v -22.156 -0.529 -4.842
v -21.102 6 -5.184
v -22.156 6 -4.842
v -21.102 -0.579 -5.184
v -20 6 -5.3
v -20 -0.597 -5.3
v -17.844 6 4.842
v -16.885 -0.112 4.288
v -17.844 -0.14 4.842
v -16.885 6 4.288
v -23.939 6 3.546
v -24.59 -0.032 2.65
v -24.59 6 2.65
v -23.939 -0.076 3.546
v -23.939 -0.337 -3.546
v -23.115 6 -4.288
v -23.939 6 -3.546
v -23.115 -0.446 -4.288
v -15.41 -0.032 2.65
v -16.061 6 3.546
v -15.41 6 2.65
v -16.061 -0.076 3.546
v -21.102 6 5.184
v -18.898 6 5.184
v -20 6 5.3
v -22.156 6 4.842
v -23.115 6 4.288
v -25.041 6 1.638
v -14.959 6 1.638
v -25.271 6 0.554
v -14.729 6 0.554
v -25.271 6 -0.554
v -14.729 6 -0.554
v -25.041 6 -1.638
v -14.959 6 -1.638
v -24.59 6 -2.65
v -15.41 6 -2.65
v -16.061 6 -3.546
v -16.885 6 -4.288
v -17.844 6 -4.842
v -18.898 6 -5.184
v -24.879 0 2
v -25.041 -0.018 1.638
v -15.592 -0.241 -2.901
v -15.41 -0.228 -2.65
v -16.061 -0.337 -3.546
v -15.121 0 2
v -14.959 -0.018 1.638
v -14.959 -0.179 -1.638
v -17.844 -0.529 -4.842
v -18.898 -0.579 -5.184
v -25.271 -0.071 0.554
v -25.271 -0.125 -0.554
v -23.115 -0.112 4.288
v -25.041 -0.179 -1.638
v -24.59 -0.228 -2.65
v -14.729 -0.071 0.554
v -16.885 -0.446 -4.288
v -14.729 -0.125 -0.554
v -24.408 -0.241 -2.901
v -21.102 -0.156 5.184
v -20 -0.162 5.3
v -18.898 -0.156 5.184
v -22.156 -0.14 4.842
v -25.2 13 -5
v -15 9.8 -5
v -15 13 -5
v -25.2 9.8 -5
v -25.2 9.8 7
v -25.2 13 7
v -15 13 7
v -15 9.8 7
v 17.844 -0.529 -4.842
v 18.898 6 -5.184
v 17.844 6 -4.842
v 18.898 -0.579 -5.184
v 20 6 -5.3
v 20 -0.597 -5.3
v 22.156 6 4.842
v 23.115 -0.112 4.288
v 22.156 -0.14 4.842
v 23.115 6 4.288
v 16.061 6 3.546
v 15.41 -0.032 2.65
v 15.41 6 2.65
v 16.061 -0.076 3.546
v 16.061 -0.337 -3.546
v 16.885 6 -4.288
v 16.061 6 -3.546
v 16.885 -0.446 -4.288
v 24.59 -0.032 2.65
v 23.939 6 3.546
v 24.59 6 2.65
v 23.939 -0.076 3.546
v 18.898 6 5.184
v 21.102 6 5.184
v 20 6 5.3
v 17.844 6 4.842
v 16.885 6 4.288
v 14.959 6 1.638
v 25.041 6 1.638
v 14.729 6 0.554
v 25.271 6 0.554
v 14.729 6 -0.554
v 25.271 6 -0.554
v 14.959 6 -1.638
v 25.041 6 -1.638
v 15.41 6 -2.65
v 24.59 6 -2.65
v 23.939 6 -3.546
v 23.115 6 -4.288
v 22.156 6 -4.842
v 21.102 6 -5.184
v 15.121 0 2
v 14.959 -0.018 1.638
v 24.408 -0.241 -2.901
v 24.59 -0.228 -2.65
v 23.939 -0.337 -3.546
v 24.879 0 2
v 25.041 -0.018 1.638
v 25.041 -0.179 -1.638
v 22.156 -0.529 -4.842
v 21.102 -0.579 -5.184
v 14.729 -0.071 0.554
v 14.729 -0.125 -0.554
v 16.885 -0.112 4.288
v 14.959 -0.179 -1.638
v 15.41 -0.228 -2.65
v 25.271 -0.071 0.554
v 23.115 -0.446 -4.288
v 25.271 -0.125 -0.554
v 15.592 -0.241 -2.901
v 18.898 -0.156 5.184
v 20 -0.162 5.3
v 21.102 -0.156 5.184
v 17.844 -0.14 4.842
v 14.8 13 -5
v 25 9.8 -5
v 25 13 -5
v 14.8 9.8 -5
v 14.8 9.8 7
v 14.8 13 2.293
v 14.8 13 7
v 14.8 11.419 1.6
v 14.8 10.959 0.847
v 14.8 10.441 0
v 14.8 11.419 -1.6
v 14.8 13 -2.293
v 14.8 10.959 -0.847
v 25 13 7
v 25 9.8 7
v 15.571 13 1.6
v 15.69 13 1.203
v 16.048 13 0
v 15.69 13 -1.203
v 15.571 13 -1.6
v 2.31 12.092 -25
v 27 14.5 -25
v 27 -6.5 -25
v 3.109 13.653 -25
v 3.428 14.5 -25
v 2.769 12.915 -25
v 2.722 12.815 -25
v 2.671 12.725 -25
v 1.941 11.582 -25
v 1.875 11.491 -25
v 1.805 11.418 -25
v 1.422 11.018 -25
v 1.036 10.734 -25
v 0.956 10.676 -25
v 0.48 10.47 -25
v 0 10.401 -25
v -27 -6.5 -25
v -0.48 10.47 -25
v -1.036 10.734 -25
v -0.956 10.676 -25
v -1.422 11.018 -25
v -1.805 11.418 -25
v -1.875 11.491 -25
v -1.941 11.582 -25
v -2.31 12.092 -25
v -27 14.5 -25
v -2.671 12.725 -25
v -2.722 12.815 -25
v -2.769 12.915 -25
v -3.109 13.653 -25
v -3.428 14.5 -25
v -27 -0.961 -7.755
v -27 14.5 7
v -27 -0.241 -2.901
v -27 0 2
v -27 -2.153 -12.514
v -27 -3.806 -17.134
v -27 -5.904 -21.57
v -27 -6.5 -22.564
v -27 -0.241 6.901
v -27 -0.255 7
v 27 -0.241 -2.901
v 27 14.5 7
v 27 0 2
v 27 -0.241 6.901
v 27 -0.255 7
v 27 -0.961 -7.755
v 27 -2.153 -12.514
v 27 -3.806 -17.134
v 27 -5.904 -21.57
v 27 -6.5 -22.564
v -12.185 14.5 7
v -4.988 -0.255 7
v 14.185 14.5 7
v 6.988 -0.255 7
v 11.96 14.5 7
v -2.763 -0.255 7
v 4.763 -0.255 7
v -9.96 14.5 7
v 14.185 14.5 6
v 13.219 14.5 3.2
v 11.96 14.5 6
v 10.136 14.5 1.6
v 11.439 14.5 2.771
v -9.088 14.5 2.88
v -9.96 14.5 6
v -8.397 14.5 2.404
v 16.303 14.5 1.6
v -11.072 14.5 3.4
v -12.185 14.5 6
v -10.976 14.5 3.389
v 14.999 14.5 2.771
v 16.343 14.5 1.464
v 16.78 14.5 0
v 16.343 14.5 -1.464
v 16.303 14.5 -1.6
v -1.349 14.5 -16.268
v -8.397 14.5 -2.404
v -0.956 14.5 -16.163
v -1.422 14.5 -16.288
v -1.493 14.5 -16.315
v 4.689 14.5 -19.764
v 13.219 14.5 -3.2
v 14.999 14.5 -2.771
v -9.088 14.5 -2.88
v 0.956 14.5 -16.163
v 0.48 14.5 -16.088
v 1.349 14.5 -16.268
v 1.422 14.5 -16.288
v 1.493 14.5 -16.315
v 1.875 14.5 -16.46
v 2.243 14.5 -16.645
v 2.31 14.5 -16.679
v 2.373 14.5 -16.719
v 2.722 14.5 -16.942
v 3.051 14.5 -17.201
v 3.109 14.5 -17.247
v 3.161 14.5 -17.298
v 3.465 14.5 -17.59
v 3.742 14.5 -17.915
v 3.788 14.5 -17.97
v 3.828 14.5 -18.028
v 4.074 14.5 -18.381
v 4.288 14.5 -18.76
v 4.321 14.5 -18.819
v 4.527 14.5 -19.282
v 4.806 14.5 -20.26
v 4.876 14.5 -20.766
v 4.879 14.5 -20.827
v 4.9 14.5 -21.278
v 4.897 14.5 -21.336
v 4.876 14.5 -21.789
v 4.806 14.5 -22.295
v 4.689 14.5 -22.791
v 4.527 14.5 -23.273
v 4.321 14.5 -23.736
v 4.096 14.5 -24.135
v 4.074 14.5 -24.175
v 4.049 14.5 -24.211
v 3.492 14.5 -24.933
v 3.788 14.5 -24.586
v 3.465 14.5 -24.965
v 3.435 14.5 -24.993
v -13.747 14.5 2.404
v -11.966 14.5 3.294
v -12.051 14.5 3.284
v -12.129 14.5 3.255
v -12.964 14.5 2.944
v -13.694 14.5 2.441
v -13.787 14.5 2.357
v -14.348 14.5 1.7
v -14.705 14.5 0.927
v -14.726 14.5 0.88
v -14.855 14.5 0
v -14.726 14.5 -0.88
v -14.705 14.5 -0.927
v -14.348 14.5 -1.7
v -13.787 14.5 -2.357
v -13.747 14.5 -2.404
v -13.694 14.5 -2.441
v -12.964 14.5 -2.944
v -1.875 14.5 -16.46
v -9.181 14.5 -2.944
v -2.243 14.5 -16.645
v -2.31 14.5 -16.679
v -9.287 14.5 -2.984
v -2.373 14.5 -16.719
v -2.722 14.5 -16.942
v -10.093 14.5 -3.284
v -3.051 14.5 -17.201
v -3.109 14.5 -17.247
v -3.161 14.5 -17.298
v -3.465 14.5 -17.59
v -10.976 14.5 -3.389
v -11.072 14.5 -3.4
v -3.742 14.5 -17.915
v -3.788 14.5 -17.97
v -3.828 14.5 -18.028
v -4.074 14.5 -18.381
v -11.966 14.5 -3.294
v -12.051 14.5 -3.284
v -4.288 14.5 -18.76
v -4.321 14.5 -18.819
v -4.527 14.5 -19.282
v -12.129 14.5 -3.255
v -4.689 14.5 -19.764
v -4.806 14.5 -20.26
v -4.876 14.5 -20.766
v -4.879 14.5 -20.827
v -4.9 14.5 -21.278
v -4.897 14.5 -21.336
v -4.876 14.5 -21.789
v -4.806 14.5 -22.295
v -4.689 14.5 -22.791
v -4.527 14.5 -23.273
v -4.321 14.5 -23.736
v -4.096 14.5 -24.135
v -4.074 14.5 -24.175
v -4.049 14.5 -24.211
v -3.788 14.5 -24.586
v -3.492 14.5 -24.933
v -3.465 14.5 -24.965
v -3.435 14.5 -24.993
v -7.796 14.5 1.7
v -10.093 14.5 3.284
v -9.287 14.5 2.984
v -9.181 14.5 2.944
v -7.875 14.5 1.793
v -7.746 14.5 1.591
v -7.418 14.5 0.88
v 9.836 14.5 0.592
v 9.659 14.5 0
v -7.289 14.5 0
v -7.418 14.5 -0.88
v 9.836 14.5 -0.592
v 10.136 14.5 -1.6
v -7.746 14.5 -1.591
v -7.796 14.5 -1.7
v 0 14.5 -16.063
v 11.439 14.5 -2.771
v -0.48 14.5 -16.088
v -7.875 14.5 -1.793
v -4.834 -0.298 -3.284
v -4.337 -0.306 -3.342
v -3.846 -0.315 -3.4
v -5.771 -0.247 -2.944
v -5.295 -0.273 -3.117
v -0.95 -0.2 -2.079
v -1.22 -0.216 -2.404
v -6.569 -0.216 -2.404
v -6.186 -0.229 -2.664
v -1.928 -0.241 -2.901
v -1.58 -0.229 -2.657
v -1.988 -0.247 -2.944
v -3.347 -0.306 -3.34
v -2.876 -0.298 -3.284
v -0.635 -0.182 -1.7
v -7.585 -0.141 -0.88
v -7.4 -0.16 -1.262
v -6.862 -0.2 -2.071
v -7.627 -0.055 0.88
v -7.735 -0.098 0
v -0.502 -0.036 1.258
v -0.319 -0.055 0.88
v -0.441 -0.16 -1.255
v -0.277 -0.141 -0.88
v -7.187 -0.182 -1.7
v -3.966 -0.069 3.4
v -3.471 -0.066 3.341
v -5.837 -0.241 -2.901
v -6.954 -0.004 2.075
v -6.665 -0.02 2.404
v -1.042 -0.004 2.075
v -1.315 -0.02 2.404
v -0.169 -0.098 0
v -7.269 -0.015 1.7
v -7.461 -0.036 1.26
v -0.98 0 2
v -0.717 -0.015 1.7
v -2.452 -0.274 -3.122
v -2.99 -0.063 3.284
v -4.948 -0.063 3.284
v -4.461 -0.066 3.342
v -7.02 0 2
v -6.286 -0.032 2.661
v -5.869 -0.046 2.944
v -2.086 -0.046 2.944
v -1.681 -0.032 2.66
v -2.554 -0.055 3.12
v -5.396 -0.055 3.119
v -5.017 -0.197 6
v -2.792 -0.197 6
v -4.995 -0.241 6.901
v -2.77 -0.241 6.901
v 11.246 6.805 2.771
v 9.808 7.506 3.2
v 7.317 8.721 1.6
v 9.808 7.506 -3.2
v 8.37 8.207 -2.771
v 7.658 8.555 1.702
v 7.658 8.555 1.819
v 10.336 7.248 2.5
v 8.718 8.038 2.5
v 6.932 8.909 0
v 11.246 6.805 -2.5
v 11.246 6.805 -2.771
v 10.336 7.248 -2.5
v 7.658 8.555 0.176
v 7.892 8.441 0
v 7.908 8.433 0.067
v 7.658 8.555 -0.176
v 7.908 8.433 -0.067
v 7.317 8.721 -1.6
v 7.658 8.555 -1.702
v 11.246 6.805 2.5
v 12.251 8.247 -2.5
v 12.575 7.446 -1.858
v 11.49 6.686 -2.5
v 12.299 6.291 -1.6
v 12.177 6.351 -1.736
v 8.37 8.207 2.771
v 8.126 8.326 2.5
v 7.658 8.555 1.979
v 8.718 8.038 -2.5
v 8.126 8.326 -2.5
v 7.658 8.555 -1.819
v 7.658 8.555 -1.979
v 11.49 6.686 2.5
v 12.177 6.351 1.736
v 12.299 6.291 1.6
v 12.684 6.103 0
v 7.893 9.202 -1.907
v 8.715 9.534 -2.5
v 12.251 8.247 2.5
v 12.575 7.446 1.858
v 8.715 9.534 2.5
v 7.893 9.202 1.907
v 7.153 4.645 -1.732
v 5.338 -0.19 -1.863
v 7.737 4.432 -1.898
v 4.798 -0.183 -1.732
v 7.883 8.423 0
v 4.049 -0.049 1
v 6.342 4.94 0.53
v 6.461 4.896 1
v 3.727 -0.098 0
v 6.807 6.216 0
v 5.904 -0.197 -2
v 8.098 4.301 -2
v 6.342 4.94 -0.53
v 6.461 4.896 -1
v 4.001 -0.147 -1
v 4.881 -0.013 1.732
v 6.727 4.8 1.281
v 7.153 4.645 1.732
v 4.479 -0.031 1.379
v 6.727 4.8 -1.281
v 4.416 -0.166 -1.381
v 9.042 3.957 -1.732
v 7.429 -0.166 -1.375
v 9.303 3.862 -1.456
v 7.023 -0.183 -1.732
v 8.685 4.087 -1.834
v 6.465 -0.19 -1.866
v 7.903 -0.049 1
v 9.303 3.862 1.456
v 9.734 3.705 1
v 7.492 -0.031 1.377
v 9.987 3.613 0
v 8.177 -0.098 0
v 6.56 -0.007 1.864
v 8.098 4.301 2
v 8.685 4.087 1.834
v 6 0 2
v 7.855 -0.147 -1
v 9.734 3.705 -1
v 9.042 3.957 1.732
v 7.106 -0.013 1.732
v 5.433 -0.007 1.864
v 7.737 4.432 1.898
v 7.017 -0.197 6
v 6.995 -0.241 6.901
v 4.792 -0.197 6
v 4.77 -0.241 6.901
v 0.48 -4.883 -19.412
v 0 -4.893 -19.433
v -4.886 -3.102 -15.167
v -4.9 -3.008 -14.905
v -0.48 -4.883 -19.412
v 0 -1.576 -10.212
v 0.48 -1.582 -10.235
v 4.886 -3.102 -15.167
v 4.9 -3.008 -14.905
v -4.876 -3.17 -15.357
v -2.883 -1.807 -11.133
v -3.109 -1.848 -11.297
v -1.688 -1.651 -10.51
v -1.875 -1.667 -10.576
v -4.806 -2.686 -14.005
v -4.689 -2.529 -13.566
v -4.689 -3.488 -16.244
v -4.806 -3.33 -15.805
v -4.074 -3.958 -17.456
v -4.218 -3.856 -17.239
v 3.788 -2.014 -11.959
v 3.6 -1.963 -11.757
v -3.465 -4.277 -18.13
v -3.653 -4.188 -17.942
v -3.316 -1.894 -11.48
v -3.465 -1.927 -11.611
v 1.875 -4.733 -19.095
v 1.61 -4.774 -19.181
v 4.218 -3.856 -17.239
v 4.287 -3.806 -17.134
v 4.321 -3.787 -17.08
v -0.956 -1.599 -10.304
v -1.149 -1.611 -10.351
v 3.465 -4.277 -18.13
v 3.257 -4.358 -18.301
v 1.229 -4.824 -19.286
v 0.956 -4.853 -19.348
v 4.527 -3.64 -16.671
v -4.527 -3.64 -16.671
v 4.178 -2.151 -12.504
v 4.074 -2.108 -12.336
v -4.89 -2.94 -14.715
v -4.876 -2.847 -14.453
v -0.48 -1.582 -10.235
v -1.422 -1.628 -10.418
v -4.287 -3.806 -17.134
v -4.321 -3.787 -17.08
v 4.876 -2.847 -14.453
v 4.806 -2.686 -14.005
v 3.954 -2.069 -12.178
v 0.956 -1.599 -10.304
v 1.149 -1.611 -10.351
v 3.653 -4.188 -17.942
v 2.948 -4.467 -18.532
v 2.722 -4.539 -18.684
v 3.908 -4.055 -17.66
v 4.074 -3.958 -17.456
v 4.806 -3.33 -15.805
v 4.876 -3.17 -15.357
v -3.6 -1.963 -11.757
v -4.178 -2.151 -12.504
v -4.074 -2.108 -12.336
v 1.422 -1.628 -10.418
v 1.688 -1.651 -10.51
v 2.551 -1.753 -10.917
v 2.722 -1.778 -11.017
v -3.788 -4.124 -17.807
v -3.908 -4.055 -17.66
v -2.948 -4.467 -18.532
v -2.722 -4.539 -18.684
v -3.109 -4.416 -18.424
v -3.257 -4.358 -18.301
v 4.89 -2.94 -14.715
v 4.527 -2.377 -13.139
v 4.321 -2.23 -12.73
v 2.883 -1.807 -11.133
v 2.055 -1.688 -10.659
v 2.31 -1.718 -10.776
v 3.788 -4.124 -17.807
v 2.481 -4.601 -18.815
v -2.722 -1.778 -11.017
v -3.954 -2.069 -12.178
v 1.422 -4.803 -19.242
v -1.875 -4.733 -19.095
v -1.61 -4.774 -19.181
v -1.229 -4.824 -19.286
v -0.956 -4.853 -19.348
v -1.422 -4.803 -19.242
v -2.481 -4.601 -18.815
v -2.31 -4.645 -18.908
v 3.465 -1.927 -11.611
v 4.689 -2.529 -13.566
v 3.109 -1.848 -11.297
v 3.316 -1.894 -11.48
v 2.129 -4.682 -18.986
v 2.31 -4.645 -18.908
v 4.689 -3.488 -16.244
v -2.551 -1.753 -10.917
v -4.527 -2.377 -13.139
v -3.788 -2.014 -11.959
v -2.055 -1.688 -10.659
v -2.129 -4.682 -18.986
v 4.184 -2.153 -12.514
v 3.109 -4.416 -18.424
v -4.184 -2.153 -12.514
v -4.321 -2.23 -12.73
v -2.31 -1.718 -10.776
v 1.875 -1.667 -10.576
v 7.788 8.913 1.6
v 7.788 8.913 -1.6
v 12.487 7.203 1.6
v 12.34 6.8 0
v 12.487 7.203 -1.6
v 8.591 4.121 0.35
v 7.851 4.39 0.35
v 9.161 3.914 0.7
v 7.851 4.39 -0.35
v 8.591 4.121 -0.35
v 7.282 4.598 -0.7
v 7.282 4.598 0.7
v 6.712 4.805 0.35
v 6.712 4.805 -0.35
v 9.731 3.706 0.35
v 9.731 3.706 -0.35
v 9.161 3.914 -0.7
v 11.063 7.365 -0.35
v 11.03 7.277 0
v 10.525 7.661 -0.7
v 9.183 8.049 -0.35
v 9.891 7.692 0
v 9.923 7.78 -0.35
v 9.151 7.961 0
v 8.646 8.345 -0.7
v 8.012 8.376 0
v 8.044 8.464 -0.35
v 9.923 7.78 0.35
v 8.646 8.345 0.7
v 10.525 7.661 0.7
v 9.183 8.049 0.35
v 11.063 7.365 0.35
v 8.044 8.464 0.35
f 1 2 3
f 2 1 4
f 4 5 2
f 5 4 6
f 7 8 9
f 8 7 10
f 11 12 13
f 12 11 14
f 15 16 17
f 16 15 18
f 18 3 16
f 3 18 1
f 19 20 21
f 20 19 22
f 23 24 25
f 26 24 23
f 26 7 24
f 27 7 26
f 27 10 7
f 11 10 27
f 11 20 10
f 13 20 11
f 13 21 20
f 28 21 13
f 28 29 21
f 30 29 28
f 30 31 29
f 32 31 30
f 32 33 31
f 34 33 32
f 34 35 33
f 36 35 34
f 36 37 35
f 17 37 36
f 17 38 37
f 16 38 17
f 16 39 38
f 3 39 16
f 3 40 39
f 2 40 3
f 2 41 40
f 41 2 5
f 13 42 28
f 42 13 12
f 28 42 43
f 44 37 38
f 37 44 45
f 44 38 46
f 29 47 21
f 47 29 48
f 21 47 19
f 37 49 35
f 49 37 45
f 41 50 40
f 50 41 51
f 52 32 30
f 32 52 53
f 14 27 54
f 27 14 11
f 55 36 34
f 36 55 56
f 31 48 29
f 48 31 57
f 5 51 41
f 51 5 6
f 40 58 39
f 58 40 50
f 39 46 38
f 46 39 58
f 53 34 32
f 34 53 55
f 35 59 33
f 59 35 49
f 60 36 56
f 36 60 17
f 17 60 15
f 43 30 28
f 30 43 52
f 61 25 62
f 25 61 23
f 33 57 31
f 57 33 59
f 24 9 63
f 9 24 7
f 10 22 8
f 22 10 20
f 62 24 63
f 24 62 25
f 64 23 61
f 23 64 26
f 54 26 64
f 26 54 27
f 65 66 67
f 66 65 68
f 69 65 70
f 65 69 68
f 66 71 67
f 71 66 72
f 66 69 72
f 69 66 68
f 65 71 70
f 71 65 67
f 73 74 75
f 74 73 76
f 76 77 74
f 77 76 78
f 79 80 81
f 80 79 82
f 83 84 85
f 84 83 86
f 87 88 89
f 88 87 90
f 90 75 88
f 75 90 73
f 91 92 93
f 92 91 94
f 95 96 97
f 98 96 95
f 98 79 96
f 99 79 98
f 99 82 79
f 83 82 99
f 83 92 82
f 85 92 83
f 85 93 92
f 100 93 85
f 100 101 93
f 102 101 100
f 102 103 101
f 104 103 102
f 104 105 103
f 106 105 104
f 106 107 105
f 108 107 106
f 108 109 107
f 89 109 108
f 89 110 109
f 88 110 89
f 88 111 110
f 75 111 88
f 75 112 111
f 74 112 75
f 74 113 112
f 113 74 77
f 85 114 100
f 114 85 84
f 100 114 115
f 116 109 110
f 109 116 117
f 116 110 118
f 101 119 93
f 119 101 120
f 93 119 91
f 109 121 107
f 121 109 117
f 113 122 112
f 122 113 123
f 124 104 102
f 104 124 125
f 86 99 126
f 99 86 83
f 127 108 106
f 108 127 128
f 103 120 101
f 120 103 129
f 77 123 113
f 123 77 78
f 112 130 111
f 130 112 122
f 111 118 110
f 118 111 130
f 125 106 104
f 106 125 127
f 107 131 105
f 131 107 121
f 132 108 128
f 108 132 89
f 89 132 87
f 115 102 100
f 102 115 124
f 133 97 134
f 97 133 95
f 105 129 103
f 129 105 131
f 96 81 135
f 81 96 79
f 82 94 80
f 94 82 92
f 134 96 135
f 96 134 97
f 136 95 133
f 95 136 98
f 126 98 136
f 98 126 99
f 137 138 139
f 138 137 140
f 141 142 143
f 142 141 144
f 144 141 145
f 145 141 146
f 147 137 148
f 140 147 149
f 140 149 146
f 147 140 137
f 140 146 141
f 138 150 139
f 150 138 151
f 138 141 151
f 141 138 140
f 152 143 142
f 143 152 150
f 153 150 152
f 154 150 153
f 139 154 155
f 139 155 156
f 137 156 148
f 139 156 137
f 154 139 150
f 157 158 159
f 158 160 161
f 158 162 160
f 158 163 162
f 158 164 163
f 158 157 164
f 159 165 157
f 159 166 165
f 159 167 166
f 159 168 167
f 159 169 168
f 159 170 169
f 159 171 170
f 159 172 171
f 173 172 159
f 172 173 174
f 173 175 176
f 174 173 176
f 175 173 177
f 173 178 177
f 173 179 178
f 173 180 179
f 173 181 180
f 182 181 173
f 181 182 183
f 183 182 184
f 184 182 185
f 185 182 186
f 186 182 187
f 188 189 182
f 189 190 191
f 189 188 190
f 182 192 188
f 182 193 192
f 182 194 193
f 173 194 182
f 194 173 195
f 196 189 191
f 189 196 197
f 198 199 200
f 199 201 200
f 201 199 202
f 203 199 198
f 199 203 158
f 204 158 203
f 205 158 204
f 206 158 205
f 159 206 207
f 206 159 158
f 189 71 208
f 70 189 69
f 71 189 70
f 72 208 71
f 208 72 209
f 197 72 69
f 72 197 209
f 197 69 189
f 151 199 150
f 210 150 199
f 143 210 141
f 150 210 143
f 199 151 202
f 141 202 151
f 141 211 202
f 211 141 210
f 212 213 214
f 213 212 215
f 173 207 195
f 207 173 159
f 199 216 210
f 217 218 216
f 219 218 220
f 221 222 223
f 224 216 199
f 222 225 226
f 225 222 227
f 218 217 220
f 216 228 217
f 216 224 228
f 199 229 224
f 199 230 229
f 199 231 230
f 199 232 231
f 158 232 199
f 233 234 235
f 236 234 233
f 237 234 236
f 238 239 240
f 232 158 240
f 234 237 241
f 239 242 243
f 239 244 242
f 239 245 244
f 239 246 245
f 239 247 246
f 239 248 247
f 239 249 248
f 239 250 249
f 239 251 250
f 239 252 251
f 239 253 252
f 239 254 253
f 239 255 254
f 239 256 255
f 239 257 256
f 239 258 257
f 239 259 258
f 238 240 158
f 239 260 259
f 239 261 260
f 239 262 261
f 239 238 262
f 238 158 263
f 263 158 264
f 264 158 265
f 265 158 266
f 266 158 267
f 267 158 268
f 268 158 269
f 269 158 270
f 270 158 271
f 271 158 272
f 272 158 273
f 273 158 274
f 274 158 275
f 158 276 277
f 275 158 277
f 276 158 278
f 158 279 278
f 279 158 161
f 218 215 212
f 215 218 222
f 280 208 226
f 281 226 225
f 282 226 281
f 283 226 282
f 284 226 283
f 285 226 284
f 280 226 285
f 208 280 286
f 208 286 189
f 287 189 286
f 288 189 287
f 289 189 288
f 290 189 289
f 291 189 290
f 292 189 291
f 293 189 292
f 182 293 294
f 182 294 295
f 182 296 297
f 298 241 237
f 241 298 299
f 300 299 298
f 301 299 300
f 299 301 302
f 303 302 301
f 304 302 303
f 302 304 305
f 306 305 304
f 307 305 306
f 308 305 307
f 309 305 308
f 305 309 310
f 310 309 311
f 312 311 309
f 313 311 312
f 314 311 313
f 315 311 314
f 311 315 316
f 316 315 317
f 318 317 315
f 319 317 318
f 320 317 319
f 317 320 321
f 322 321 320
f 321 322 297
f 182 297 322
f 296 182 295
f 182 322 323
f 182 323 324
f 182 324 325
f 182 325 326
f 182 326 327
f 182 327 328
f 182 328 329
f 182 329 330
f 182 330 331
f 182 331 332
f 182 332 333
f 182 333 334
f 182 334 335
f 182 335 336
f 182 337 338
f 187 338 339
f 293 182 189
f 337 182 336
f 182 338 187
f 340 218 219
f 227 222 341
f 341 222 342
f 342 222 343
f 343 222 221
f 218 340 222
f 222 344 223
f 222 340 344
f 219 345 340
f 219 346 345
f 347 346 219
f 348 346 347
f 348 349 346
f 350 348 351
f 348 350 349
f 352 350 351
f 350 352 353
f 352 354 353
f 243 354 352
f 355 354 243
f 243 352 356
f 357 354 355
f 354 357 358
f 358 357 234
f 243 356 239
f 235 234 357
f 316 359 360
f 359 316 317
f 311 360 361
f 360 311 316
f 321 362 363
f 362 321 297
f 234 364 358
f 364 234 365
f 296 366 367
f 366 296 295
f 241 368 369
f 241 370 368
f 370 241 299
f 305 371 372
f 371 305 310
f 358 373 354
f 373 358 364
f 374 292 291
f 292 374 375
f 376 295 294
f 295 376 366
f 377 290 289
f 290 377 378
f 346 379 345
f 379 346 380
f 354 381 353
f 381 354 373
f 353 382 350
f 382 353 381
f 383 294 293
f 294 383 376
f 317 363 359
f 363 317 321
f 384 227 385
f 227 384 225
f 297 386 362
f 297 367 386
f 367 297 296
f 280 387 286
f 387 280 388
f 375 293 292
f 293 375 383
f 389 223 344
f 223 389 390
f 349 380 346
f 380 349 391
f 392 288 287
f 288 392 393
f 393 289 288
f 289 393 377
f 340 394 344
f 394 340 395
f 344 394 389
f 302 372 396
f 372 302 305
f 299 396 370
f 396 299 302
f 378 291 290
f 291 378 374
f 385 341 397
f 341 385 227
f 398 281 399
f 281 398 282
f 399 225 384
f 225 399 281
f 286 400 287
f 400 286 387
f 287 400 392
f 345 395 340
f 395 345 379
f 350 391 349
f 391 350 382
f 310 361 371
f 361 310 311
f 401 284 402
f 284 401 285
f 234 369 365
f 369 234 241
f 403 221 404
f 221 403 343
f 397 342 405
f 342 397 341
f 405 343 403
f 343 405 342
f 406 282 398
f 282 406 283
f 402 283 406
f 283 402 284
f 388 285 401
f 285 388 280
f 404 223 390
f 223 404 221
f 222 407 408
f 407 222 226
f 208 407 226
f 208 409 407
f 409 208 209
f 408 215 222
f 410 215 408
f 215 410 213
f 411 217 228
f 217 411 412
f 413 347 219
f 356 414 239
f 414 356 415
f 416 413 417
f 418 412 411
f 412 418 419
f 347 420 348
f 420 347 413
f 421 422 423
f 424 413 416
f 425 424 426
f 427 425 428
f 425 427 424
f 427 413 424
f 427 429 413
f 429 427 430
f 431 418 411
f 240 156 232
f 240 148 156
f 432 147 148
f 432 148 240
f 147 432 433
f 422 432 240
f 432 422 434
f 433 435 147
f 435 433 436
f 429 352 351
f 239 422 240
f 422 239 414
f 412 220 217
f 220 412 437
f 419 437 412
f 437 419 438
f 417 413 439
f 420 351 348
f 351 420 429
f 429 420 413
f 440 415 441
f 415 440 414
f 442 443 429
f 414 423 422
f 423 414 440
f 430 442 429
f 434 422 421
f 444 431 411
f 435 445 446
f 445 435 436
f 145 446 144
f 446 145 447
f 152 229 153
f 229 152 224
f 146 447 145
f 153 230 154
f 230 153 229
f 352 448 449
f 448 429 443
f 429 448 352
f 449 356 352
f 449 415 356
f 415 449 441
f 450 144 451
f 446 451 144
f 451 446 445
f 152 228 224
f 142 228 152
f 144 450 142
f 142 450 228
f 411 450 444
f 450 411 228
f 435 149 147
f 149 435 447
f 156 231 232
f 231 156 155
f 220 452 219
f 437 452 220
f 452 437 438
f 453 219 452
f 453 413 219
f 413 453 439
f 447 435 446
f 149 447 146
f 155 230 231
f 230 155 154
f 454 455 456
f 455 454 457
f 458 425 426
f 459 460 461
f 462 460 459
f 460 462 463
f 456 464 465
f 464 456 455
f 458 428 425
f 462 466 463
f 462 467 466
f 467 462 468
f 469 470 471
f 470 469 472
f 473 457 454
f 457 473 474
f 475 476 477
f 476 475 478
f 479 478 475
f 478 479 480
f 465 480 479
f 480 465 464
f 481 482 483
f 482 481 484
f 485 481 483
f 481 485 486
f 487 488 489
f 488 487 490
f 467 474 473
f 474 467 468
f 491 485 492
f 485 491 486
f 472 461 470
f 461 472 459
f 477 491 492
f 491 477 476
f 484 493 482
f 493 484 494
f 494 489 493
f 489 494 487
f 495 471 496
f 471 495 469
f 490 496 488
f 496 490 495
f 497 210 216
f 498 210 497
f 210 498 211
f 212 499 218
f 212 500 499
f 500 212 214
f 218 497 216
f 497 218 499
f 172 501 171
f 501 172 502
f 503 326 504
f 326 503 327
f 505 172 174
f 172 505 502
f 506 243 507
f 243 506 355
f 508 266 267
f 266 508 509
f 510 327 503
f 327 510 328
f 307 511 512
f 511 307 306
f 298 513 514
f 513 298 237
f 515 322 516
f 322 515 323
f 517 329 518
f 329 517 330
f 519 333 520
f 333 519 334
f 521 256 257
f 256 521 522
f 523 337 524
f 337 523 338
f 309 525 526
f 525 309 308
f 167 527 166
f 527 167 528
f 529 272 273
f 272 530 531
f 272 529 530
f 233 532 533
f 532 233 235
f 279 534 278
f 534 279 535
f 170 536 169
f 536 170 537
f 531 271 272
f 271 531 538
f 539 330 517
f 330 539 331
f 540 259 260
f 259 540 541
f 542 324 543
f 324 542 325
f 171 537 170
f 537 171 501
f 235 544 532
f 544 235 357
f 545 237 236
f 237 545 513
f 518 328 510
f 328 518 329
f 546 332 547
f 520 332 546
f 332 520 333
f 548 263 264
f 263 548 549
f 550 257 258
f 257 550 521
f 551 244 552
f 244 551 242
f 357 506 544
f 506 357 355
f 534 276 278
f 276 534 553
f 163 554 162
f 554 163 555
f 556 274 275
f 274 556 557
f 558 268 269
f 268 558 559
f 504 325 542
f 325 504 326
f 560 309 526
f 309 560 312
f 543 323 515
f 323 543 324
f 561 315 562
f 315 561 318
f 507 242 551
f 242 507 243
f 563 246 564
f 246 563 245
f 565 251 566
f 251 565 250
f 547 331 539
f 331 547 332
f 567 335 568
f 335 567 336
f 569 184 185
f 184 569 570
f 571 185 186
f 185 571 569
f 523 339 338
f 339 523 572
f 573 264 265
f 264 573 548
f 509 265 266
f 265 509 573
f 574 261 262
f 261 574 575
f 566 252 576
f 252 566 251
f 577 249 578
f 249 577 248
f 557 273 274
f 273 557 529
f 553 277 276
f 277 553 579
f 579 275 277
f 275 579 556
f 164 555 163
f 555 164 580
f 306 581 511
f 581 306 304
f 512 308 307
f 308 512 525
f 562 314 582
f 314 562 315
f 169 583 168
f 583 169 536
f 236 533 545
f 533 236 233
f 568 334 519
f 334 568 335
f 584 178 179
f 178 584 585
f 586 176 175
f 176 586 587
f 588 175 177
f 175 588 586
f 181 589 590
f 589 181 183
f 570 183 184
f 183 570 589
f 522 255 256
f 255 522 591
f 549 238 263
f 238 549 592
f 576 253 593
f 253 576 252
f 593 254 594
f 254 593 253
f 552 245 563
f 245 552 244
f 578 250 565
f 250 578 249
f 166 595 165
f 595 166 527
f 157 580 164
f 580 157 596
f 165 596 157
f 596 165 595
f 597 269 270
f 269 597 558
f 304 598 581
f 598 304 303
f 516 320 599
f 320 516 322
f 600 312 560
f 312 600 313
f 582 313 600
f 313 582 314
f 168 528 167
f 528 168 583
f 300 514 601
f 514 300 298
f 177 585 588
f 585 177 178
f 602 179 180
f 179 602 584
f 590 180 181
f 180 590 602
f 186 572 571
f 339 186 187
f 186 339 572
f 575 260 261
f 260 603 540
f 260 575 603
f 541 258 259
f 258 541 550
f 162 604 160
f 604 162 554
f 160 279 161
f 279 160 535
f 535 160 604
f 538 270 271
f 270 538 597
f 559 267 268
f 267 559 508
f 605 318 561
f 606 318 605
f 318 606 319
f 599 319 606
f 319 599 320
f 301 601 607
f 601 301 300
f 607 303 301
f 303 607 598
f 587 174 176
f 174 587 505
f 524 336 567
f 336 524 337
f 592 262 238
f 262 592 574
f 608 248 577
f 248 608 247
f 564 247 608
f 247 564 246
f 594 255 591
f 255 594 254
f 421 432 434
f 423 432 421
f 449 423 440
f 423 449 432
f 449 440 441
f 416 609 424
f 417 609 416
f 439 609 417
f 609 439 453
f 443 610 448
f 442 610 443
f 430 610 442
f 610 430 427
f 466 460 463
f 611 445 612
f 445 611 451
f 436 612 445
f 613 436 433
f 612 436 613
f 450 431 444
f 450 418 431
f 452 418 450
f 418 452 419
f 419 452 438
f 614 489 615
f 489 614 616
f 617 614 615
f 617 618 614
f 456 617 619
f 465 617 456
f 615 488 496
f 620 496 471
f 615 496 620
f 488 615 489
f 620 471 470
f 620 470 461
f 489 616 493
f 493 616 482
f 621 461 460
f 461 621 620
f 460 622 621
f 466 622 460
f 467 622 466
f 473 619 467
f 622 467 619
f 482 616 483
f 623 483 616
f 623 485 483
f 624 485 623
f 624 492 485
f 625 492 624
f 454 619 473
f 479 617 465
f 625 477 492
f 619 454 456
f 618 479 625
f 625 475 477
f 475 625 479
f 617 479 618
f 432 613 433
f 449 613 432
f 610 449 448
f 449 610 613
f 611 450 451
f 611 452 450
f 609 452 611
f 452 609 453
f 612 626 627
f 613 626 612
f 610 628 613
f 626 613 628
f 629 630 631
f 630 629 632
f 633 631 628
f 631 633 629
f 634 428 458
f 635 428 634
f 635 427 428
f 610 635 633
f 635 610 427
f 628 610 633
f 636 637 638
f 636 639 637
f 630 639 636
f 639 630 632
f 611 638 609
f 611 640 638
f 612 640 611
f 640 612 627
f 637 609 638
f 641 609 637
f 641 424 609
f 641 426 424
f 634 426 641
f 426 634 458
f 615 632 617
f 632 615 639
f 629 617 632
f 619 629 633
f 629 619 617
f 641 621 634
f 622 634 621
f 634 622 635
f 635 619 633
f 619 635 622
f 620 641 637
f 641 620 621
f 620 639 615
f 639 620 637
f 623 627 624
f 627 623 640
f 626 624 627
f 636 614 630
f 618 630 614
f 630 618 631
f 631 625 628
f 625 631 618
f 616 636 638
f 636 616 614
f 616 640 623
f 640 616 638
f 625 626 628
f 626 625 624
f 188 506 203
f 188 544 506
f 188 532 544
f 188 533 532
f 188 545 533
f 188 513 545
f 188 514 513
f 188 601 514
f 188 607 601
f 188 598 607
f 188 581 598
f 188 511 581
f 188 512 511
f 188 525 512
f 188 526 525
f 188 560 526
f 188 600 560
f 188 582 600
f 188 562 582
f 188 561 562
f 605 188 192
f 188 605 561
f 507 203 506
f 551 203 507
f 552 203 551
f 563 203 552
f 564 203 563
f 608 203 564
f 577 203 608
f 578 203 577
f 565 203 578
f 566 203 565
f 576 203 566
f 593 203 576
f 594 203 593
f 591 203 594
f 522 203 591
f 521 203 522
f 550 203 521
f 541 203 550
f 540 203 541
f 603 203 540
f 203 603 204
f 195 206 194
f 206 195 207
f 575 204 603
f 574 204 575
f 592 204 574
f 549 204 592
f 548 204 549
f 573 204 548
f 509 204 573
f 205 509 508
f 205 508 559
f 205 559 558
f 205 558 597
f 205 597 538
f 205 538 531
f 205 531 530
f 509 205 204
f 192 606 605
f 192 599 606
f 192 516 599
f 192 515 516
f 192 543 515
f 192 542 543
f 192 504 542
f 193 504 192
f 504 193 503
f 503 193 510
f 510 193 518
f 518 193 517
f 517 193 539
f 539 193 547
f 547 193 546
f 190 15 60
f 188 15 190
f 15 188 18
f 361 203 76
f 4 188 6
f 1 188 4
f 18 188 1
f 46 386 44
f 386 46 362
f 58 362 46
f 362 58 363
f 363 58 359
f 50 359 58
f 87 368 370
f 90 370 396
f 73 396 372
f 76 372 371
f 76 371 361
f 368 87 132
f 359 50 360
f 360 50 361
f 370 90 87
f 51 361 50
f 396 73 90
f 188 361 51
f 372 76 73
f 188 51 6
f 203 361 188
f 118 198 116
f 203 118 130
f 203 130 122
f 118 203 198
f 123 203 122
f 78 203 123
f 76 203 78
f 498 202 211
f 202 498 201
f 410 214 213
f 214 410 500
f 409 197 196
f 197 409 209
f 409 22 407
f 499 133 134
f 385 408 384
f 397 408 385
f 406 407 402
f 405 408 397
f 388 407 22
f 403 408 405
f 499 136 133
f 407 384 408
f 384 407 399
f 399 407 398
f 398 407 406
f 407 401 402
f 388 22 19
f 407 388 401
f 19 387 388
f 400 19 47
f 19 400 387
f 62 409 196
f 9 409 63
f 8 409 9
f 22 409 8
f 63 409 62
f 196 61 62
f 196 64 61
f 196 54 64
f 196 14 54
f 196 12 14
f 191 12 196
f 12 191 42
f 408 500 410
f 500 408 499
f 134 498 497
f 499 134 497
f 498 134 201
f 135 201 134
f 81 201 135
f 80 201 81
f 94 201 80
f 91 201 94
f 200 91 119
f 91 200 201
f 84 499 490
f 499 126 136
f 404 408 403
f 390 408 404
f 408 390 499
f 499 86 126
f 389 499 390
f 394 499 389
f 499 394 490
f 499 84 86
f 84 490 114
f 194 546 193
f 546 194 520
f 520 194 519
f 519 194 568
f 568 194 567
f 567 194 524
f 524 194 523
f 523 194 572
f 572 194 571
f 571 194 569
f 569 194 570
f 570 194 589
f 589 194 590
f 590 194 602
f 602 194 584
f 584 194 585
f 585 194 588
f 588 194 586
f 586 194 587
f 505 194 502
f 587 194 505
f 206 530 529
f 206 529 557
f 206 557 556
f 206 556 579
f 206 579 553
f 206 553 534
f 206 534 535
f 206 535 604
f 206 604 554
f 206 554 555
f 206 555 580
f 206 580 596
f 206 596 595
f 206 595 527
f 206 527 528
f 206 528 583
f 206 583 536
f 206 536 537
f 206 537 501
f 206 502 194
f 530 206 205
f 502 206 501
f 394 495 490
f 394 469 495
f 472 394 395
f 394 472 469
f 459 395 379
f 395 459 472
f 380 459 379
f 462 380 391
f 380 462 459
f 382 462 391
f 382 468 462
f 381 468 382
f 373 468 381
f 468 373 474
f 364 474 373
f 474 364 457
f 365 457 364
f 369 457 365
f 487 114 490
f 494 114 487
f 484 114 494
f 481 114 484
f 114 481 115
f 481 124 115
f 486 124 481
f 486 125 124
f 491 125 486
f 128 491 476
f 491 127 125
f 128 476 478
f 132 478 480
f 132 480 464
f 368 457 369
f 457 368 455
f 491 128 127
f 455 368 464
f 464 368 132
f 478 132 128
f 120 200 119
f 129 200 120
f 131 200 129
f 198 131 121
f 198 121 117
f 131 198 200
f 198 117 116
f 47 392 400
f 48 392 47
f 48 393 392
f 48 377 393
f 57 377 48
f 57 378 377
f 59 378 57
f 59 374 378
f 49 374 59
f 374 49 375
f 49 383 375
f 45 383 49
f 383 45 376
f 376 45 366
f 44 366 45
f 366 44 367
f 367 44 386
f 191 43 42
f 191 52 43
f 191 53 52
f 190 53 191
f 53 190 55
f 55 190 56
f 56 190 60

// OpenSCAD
diameter=10;
height=4;
number=3;
distance=5;
baseline=36; 


module maghole(diameter,height,number,back) {
		translate([0,height*(number-2)/2,0])
        rotate([90,0,0])
         cylinder(r=diameter/2,h=height*(2*number-1),center=true);
    if(back == 1) {
		translate([0,-height*2*(number+1)/2,0])
        rotate([90,0,0])
         cylinder(r=diameter/6,h=height*number,center=true);
    }
}

module smaghole(diameter,height,number,back) {
		translate([0,(height*(number-2)/2),0])
        rotate([90,0,0])
         cylinder(r=0.3+diameter/2,h=height*4,center=true,$fs = 0.01);
//         cylinder(r=0.3+diameter/2,h=height*(2*number-1),center=true);

    translate([-9,-13,-5]) cube([4+diameter,3.2,diameter+0.2]);    
   // translate([-1,-15,0]) cube([3,3,10]);
}
module mirror(diameter,height,number,distance,baseline) {
width=diameter+4;
depth=distance+height*number+4;
length=baseline+diameter+8;
mirrorthick = 2.7;
   difference() {
     translate([0,-height,0])
	   cube([width,  // Small dimension
            depth, // Optical path dim
		      length],center=true);
      translate([0,0,2+baseline/2])
             maghole(diameter,height,number,0);
     translate([0,0,-(2+baseline/2)])
             maghole(diameter,height,number,0);
     translate([0,depth/4,0])
          cube([width+2,depth+2,length-2*width],center=true);
    rotate([7,0,0])
     translate([0,0.6-depth/3,0.75])
          cube([width+2,mirrorthick+0.6,length-(2*diameter+4)],center=true);
     }
}

module sensor(diameter,height,number,distance,baseline) {
width=diameter+4;
depth=distance+height*number+4;
length=baseline+diameter+8;
mirrorthick = 2.6;
extra=2*width+4;

   difference() {
     translate([2+width/2,-height,0])
	   cube([extra,  // Small dimension
            depth, // Optical path dim
		      length],center=true);
      translate([0,0,2+baseline/2])
             smaghole(diameter,height,number,1);
     translate([0,0,-(2+baseline/2)])
             smaghole(diameter,height,number,1);
//LASER
     translate([0,0,4])
        rotate([64,0,0])
             cylinder(r=3.4,h=40,center=true,$fn=24);
     translate([-11,0,4])
        rotate([64,0,0]) cube([10,2,40],center=true);
//PhotoTransistor
     translate([0,-12,-12])
        rotate([116,0,0])
             cylinder(r=3.2,h=10,center=true,$fn=12);
     translate([0,0,-6])
        rotate([116,0,0])
             cylinder(r=2,h=40,center=true,$fn=12);
     translate([-11,0,-6])
        rotate([116,0,0]) cube([10,2,40],center=true);
//TEMP SENSOR
     translate([2+width,0,0])
        rotate([90,0,20])
             cylinder(r=4.9,h=40,center=true,$fn=64);

     }
translate([0,-4,-6])
rotate([20,0,0])
     difference() {
     translate([0,-4,-2.5])cube([5,6,5],center=true);
     translate([0,-8,0])
        cylinder(r=3.2,h=10,center=true,$fn=12);
     translate([0,0,-1.0])
        rotate([90,0,0])
             cylinder(r=0.7,h=40,center=true,$fn=6);
     translate([0,0,-3])
        rotate([90,0,0])
             cylinder(r=0.7,h=40,center=true,$fn=6);
     }
}

module jarwall() {
  difference() {
     cube([40,40,120],center=true);
	  translate([40,0,0])
	     cylinder(r=50,h=120,center=true,$fn=64);
	   }
}

module jar() {
	  translate([-8,110,-10])
	          cylinder(r=50,h=120,center=true,$fn=64);
}

module powerhole(dim) {
offset = dim+2;
  //  cylinder(r=dim,h=2*dim,center=true,$fn=10);
  //  translate([dim-1.6,0,0])
   //   cylinder(r=dim,h=dim,center=true,$fn=10);
    translate([dim-3,0,0]) cube([2*dim+2,2*dim-1,2*dim-1],center=true);
    translate([-offset,0,0])
      cylinder(r=1.1,h=2*dim,center=true,$fn=10);
    translate([offset+2,0,0])
      cylinder(r=1.1,h=2*dim,center=true,$fn=10);
}

module sensordevice() {
  wall = 32;
  side = 44;
  deep = 50;
  difference() { 
   sensor(diameter,height,number,distance,baseline);
   translate([6,-60,3]) jar();
  }
//  translate([-7,-(wall+30),21]) cube([wall,side+12,3]);

//     translate([-7,-(wall+30),-24])
//         cube([wall,side+12,3]);

//  difference() {
//  translate([23.5,-(wall+7),0])
//    rotate([0,90,0])
//    cube([side,deep,3],center=true);
//     translate([24,-54,12])
//			rotate([0,90,0]) 
//           powerhole(4.5);
//  }
}
module mirrordevice() {
  difference() { 
   mirror(diameter,height,number,distance,baseline);
   translate([0,-3.3,0]) rotate([0,0,-90]) jarwall();
  }
}

rotate([0,90,180]) 
   sensordevice();
  // mirrordevice();



     
